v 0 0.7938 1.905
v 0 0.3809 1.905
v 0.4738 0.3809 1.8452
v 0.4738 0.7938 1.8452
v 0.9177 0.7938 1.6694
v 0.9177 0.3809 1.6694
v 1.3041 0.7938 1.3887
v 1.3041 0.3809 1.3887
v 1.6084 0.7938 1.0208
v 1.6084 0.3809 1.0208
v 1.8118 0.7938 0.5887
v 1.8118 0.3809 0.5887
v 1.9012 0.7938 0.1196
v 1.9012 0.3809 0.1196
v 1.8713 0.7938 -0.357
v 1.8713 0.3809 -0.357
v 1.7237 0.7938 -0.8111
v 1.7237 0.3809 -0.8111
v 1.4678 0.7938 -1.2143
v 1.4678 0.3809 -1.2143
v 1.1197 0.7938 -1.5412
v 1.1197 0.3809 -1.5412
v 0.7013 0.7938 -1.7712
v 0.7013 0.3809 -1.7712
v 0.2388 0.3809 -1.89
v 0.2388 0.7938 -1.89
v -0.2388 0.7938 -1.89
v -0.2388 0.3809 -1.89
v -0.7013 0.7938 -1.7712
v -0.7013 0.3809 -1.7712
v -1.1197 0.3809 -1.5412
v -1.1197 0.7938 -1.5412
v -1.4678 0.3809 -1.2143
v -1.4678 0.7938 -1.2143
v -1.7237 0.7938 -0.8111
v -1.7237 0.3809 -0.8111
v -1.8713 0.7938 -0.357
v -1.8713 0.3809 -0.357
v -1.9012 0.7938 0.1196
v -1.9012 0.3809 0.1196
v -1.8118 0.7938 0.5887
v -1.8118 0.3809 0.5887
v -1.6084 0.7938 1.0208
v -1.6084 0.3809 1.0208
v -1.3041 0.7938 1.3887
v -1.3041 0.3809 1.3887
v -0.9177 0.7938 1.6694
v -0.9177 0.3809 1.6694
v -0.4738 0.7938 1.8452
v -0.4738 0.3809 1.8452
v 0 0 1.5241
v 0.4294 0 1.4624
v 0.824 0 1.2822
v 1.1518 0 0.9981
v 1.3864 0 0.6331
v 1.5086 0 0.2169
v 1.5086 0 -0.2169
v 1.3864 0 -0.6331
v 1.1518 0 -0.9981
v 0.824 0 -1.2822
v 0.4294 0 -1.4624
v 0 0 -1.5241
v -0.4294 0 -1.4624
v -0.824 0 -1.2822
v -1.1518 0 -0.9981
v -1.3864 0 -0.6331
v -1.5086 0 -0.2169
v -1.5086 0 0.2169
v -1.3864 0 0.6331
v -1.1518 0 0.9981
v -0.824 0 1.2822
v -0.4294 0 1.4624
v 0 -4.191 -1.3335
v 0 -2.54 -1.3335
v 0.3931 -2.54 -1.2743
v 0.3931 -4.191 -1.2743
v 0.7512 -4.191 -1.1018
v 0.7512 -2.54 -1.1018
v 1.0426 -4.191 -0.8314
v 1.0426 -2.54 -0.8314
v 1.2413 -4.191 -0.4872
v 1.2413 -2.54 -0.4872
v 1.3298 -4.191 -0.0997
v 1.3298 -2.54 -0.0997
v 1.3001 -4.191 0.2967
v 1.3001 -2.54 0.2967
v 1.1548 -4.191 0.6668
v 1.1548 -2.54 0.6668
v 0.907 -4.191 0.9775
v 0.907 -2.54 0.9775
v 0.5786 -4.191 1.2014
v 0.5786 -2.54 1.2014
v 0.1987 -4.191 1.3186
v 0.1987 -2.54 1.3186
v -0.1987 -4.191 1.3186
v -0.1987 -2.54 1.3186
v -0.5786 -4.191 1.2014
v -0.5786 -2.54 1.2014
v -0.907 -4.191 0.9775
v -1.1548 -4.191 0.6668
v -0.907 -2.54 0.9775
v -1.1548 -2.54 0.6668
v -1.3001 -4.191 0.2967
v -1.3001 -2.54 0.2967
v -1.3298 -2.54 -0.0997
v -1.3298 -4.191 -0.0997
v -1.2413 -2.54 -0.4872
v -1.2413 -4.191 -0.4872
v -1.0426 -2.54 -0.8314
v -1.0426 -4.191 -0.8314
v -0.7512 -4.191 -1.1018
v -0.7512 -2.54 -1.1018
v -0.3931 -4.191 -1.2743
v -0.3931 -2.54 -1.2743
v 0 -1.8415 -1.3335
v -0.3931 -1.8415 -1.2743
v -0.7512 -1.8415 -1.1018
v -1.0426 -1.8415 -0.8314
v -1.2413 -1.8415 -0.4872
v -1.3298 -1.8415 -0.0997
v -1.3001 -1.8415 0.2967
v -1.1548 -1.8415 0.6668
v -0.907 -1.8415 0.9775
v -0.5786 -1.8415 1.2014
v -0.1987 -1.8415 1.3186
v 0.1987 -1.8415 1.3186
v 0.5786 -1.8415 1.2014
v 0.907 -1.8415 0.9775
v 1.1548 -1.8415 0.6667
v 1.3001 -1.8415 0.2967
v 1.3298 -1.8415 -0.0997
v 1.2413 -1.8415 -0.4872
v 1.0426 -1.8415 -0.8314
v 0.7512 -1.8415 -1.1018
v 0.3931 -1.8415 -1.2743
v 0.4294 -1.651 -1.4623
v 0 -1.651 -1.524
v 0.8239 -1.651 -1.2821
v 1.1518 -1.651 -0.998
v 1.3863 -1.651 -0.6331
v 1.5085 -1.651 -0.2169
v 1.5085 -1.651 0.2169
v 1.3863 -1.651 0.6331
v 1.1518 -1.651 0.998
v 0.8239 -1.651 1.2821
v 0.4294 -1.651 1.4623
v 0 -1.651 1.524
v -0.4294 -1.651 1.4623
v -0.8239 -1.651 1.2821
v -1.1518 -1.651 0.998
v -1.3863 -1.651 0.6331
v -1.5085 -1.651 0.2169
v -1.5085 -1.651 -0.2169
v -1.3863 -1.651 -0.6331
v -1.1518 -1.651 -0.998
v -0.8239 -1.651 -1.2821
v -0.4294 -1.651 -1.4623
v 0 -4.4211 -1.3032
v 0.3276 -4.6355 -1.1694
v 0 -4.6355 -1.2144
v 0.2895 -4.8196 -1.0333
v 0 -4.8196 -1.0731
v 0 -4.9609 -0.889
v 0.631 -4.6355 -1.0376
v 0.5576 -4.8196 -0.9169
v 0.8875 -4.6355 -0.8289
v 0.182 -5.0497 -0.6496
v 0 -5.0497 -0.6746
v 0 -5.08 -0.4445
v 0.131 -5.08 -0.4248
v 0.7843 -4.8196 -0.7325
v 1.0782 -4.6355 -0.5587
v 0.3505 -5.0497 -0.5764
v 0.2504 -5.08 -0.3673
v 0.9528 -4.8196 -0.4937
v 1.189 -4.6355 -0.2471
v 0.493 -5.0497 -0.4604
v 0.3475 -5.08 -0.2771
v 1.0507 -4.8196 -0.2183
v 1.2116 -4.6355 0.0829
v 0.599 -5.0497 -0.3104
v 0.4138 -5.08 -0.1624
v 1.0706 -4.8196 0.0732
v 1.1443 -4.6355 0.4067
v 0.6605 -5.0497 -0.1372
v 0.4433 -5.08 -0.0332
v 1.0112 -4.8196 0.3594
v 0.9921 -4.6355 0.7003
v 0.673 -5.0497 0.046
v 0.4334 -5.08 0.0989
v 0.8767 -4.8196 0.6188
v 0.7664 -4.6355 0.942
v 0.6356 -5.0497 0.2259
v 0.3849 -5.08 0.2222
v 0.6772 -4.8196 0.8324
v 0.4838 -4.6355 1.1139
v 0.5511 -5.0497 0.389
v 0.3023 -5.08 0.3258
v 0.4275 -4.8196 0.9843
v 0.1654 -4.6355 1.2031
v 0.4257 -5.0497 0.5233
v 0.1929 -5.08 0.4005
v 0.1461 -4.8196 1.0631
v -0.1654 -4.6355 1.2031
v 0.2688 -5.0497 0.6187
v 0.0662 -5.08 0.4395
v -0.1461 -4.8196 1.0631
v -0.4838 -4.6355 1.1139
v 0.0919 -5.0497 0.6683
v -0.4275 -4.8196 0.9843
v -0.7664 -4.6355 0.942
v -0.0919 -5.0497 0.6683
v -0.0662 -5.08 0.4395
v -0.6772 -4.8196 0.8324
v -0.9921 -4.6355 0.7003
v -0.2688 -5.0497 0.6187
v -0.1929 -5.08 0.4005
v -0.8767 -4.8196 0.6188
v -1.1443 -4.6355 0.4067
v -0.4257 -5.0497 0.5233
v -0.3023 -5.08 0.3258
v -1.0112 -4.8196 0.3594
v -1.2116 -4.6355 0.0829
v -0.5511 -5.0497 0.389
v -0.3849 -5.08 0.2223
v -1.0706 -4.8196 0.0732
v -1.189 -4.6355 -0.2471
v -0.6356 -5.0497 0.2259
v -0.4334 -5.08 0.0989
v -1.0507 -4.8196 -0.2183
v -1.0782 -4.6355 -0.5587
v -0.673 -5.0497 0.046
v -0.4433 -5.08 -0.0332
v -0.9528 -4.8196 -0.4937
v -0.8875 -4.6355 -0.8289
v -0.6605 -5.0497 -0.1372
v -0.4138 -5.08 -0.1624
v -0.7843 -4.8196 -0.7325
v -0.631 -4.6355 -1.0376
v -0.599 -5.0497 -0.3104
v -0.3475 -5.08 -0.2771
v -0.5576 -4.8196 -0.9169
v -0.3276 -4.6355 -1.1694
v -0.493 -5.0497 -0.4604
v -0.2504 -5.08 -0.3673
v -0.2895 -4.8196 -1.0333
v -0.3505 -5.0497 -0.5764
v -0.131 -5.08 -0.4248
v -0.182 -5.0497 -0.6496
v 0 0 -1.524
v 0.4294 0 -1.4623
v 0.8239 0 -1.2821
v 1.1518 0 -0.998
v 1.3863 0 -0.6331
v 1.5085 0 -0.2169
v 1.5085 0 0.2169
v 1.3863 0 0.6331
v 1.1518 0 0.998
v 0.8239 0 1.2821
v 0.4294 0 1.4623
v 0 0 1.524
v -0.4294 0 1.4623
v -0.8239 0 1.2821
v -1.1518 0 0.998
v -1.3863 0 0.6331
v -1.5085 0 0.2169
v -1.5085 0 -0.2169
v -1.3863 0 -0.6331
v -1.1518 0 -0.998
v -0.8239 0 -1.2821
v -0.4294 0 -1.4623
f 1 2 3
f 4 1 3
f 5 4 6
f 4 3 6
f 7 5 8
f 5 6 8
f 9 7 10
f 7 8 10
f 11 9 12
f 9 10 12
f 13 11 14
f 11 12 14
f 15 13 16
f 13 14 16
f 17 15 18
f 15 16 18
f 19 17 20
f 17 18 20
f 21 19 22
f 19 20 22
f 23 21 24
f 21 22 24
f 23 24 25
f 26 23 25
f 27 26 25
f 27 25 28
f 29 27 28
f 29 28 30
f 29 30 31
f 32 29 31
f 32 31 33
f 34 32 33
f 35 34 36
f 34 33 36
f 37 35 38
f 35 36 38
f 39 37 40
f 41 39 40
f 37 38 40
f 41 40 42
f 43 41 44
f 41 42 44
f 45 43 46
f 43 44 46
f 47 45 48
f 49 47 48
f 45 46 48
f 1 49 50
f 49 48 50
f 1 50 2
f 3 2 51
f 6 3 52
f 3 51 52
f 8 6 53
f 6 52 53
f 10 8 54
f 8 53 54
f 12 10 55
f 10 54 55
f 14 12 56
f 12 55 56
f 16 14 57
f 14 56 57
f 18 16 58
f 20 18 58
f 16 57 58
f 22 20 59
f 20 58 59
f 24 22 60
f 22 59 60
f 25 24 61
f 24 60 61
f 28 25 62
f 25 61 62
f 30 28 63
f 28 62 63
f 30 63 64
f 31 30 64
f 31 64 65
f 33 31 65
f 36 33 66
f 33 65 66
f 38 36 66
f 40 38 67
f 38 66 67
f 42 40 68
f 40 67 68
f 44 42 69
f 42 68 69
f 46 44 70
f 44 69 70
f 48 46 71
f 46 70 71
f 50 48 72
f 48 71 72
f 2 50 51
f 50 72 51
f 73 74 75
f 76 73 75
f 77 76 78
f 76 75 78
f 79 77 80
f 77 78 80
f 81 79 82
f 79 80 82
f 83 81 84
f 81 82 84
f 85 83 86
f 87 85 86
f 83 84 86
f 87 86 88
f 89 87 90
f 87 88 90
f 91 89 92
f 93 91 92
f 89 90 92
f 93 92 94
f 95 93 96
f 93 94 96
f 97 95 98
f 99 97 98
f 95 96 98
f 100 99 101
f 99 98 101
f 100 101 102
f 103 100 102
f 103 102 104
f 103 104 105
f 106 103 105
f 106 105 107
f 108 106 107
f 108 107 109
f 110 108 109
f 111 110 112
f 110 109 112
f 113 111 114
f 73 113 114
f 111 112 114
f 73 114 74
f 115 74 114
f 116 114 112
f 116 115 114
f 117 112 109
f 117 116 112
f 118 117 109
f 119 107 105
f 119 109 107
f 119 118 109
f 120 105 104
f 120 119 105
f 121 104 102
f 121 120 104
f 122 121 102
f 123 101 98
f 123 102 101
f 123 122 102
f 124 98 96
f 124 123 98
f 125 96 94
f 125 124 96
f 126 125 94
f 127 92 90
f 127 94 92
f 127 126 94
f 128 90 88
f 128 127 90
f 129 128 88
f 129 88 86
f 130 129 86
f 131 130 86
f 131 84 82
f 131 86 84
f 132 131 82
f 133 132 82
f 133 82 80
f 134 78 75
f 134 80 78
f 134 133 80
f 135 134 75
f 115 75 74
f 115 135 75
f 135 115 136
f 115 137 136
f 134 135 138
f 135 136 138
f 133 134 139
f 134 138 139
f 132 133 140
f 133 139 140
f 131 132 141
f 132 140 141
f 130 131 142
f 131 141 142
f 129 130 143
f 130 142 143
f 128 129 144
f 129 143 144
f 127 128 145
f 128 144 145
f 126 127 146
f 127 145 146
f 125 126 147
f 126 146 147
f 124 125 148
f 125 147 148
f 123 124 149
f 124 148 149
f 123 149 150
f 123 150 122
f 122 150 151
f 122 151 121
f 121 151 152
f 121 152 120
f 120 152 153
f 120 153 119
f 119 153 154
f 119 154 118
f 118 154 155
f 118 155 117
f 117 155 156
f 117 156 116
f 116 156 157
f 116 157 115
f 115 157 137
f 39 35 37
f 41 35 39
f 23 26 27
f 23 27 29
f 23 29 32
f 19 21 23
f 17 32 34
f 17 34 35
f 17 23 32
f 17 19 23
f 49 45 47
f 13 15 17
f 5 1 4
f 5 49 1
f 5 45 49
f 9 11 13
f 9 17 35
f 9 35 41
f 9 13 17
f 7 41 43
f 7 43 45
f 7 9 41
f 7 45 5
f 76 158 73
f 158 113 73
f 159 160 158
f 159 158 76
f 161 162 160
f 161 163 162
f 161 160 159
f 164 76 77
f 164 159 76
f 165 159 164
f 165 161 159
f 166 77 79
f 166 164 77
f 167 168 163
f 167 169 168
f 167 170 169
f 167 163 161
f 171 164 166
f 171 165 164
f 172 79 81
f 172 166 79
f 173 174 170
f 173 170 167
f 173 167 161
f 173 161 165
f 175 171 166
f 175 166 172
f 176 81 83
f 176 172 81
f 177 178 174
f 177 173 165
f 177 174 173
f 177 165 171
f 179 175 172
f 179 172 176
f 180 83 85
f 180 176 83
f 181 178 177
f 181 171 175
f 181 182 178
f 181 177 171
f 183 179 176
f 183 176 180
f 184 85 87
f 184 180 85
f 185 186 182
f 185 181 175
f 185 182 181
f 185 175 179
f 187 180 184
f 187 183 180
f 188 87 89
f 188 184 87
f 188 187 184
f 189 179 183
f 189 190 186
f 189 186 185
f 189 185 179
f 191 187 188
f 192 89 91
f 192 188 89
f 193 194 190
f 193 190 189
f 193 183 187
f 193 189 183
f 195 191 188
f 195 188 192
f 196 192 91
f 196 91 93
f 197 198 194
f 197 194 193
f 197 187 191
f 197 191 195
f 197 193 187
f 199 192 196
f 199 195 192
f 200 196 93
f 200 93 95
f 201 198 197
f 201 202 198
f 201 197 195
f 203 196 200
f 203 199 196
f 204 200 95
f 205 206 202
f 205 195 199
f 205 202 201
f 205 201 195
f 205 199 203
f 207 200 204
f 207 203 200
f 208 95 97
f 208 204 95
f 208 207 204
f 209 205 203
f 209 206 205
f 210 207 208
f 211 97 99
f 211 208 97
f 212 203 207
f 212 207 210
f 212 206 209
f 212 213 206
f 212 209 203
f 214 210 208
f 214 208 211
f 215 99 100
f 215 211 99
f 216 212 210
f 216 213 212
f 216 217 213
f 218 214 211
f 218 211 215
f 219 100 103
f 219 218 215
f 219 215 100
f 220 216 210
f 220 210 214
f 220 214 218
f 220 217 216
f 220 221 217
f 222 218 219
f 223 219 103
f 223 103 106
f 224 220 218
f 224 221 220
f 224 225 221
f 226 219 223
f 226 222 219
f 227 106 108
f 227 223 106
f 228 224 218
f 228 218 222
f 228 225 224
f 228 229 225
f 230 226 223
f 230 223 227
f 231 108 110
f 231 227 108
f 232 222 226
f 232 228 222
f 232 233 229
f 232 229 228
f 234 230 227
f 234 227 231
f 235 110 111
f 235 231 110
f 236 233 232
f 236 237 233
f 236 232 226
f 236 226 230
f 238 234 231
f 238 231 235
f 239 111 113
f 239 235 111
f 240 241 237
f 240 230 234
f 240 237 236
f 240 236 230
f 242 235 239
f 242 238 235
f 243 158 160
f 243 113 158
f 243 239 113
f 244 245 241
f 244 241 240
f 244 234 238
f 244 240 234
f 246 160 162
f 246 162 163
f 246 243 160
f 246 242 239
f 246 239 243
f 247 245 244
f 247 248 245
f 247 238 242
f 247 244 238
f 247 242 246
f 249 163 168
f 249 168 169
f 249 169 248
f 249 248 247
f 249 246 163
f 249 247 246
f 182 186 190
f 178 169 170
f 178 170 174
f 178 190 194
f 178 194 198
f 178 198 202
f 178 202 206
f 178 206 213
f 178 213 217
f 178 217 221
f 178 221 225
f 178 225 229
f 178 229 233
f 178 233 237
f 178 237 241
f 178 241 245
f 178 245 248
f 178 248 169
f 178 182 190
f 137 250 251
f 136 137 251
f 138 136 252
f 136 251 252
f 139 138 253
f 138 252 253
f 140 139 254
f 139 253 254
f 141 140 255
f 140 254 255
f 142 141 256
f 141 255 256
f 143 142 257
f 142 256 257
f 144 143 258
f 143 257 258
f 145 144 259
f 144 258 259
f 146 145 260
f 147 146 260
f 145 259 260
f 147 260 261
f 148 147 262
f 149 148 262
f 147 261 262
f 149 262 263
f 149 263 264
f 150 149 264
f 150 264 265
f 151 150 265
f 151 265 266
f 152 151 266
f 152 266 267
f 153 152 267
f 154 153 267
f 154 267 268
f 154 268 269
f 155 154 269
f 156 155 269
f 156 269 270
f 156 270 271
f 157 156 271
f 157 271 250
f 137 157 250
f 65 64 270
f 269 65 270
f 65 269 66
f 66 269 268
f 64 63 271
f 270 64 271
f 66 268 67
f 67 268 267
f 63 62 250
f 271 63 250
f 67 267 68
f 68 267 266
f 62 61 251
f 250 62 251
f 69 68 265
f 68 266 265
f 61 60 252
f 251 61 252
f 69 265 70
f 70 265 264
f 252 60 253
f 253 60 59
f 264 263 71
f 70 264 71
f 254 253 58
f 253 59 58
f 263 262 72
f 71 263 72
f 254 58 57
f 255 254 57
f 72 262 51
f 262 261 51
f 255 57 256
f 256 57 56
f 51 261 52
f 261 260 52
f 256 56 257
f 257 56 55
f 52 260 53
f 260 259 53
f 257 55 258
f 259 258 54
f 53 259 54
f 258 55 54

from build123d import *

# Parameters (mm, degrees)
SKETCH1_R           = 1.905
BOSS_EXTRUDE1_DEPTH = 0.79375
SKETCH2_R           = 1.524
BOSS_EXTRUDE2_DEPTH = 2.54
CHAMFER1_SIZE       = 0.381
SKETCH4_R           = 1.3335
BOSS_EXTRUDE3_DEPTH = 2.54
FILLET3_R           = 0.889
CHAMFER2_SIZE       = 0.889


# Some blends are built 0.0001 mm under size
with BuildPart() as part:
    # Sketch1 → Boss-Extrude1 (new body)
    with BuildSketch(Plane(origin=(0, 0, 0), x_dir=(1, 0, 0), z_dir=(0, 1, 0))):
        with Locations(Location((0, 0, 0), (0, 0, 270))):
            Circle(SKETCH1_R)
    extrude(amount=BOSS_EXTRUDE1_DEPTH)

    # Sketch2 → Boss-Extrude2 (add)
    with BuildSketch(Plane.XZ):
        with Locations(Location((0, 0, 0), (0, 0, 270))):
            Circle(SKETCH2_R)
    extrude(amount=BOSS_EXTRUDE2_DEPTH)

    # Chamfer1
    chamfer1_edges = [part.edges().sort_by_distance(p)[0] for p in [
        (0, 0, -1.905),
    ]]
    chamfer(chamfer1_edges, length=CHAMFER1_SIZE - 0.0001)  # a hair under: the kernel refuses the full size

    # Sketch4 → Boss-Extrude3 (add)
    with BuildSketch(Plane.XZ.offset(2.54)):
        with Locations(Location((0, 0, 0), (0, 0, 270))):
            Circle(SKETCH4_R)
    extrude(amount=BOSS_EXTRUDE3_DEPTH)

    # Fillet3
    fillet3_edges = [part.edges().sort_by_distance(p)[0] for p in [
        (0, -5.08, 1.3335),
    ]]
    fillet(fillet3_edges, radius=FILLET3_R)

    # Chamfer2
    # the kernel refuses this chamfer: 0.889 mm, written as the material it takes off along each edge
    with BuildSketch(Plane(origin=(0, -2.54, 0), x_dir=(0, 0, -1), z_dir=(-1, 0, 0))) as chamfer2_piece_1_section:
        Polygon((1.524 - CHAMFER2_SIZE, 0), (1.524, -CHAMFER2_SIZE), (1.524, 0), align=None)
    chamfer2_piece_1 = revolve(axis=Axis((0, -2.54, 0), (0, -1, 0)), mode=Mode.PRIVATE)
    chamfer2_piece_1 = chamfer2_piece_1 - Plane(origin=(0, -1.741914517, 0), x_dir=(0, 0, -1), z_dir=(0, 1, 0)) * Cylinder(1.3335, 7, mode=Mode.PRIVATE)
    add(chamfer2_piece_1, mode=Mode.SUBTRACT)


solid = part.part
